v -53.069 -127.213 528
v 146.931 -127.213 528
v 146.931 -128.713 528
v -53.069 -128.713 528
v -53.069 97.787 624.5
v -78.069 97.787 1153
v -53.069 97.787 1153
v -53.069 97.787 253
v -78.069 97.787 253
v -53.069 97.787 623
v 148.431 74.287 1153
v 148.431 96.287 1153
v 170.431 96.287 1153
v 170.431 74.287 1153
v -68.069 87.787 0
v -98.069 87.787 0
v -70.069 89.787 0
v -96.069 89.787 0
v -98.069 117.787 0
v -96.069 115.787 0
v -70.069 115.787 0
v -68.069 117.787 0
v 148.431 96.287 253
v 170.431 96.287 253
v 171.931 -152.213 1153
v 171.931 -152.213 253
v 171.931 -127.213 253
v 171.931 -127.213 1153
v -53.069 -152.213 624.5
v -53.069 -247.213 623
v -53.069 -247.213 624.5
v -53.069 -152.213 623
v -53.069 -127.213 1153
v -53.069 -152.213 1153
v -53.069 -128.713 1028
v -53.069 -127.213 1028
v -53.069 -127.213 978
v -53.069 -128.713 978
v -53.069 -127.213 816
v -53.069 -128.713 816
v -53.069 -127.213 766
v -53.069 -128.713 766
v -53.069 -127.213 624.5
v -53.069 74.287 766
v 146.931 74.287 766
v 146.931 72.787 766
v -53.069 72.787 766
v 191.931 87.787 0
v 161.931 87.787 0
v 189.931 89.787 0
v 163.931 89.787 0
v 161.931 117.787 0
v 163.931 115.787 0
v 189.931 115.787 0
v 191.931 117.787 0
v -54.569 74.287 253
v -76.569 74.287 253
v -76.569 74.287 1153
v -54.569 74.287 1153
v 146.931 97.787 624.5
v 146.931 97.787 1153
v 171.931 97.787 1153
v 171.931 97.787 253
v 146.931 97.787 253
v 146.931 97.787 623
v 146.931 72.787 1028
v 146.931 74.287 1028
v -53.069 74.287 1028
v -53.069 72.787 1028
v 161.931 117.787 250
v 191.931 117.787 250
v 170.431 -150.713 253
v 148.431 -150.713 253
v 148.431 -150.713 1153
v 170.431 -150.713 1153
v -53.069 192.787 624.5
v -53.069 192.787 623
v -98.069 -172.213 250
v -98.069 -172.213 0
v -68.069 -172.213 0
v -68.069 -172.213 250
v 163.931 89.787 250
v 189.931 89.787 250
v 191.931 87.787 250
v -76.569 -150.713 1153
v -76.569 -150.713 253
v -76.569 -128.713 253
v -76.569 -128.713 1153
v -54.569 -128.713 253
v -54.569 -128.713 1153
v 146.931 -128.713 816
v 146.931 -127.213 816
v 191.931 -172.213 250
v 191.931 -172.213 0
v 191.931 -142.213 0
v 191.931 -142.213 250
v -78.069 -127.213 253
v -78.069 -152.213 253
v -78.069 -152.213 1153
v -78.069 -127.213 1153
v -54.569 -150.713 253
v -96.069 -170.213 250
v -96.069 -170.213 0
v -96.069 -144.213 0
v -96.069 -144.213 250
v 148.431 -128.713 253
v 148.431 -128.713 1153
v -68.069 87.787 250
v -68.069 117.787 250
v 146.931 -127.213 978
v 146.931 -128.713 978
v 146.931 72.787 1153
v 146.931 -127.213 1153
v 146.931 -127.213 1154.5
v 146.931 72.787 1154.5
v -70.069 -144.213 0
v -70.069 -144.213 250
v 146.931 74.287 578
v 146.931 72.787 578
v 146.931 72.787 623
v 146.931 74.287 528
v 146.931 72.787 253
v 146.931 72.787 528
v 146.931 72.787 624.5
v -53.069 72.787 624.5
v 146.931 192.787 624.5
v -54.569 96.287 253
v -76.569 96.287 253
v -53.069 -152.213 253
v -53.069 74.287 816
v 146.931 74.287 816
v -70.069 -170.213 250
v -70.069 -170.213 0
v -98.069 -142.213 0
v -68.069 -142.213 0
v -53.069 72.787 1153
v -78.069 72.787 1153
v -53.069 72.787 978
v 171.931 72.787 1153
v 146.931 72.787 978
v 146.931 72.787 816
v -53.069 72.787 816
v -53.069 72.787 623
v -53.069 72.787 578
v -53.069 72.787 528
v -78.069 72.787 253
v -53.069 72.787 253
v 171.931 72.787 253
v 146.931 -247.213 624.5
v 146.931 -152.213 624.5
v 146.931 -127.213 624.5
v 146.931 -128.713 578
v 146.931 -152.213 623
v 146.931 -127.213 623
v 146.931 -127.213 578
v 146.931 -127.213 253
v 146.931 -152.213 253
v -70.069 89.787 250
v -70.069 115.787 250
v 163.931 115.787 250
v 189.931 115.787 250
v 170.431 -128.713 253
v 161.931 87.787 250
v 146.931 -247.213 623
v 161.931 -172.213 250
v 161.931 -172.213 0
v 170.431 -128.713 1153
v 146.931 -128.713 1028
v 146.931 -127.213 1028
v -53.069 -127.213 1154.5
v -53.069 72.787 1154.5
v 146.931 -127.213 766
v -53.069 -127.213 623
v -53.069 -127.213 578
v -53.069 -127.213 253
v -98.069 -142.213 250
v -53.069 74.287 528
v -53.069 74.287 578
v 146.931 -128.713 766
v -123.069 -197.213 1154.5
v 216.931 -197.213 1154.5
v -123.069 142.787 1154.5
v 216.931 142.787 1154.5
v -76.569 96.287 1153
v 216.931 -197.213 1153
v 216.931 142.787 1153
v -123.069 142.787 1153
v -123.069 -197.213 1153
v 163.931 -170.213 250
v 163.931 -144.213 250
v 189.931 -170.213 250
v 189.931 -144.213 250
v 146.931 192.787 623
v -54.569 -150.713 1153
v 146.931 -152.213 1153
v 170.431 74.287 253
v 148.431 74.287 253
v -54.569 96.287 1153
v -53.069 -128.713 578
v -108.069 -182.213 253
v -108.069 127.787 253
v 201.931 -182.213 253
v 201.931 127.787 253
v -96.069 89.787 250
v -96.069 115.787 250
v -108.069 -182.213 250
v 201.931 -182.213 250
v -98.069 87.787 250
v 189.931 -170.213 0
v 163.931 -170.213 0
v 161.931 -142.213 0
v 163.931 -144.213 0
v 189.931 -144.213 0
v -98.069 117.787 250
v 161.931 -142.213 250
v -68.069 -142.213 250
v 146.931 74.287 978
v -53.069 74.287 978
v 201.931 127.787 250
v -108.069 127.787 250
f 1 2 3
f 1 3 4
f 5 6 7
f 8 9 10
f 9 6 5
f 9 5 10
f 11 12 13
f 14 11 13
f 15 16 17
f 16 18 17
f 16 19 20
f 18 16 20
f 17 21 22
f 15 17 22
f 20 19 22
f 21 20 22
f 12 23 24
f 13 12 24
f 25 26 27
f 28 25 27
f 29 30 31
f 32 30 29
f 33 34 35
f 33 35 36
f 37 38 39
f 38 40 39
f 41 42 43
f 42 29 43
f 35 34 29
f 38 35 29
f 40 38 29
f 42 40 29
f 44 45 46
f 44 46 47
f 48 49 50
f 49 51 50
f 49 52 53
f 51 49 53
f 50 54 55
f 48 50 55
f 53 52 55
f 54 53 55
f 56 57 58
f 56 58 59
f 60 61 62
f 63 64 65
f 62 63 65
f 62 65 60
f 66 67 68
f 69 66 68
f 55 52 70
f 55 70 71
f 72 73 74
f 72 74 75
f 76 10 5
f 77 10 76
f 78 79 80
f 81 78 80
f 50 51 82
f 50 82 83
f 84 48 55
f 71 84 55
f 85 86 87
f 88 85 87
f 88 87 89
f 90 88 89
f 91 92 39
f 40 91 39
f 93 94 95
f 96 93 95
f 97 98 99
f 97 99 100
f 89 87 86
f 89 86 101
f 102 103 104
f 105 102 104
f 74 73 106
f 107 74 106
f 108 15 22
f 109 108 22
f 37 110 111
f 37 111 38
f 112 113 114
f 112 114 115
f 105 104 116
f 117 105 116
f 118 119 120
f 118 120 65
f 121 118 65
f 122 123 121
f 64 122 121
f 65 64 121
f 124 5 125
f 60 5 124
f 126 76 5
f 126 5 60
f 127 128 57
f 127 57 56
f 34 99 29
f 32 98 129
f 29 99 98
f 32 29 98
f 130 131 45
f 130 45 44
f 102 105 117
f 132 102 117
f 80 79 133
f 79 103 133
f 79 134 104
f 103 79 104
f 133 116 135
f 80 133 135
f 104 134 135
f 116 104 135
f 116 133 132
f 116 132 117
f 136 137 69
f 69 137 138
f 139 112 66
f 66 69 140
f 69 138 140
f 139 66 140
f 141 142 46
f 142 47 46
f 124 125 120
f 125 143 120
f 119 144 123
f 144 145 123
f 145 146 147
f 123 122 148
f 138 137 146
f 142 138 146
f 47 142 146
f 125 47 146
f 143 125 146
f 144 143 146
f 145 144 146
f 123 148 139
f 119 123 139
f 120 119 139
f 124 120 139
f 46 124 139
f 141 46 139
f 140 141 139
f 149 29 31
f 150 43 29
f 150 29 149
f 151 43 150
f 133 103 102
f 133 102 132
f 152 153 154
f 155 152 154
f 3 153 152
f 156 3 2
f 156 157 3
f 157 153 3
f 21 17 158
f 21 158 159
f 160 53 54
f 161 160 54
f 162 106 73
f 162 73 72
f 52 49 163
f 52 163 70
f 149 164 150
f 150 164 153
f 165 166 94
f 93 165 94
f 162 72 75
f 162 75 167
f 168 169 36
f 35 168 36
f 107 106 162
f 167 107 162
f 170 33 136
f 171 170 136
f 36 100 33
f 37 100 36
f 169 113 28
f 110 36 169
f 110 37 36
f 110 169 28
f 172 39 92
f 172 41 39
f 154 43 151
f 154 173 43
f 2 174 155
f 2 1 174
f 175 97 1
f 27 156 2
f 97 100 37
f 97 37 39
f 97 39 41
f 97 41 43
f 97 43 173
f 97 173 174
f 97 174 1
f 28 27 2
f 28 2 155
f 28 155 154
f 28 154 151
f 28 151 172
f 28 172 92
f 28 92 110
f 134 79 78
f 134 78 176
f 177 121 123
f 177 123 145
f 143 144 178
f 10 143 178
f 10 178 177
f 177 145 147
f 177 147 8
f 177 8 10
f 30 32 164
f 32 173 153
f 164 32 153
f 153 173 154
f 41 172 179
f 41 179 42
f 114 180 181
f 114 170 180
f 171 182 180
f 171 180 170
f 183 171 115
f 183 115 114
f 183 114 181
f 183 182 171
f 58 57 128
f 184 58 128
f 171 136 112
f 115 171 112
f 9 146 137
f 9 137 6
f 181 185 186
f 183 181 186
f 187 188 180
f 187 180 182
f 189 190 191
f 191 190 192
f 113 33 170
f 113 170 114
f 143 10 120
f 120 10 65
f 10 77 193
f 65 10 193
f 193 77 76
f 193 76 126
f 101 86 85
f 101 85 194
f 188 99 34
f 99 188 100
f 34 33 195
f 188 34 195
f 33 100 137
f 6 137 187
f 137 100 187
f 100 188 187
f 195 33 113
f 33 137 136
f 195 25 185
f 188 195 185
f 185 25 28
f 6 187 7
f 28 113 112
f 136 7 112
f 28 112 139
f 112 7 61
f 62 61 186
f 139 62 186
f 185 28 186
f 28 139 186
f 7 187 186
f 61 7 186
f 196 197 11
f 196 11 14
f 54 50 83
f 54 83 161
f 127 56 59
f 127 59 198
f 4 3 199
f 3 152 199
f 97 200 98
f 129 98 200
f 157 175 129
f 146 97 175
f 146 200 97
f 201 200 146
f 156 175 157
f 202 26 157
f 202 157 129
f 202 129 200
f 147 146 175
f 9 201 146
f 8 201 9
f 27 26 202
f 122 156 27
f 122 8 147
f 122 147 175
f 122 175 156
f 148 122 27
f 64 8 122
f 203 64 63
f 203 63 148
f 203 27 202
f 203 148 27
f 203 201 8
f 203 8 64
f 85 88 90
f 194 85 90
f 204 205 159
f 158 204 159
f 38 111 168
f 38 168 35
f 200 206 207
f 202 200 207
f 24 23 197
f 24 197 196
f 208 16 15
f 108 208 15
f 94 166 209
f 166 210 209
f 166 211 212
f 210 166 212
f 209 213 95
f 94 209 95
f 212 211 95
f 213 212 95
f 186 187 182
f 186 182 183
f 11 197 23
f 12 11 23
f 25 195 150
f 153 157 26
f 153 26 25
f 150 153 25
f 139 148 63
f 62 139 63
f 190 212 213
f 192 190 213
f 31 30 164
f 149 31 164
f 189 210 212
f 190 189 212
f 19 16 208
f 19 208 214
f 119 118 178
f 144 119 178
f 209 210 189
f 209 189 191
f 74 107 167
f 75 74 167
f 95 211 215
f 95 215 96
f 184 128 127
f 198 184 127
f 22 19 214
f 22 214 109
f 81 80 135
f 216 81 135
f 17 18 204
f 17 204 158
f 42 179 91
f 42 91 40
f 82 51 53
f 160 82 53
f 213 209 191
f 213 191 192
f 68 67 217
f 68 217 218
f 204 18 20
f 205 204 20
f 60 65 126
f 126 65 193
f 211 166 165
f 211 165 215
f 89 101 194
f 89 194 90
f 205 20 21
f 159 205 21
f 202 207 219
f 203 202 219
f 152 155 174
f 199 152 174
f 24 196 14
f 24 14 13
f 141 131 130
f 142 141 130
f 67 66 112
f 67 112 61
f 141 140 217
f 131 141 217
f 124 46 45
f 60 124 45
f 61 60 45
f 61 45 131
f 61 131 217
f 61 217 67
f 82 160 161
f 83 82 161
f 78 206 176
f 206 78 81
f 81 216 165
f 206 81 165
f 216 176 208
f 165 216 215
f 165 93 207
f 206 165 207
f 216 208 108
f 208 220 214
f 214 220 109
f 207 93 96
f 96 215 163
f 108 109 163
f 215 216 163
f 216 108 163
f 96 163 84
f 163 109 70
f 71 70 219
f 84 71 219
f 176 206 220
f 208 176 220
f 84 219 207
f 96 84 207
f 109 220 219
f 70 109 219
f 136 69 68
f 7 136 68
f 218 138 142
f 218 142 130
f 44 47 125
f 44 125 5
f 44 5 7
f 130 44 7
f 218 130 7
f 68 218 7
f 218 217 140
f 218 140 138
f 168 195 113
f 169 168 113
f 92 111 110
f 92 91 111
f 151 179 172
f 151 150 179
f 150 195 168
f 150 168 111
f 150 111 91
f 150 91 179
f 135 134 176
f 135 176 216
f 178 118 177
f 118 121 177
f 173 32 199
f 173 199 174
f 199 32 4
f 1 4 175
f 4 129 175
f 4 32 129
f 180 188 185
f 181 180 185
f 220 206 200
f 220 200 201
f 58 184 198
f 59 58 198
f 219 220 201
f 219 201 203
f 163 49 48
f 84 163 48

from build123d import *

# Parameters (mm, degrees)
SKETCH_1_W        = 30
SKETCH_1_H        = 30
SKETCH_1_W_2      = 26
SKETCH_1_H_2      = 26
EXTRUDE_1_DEPTH   = 250
EXTRUDE_1_2_DEPTH = 250
EXTRUDE_1_3_DEPTH = 250
EXTRUDE_1_4_DEPTH = 250
SKETCH_2_W        = 310
SKETCH_2_H        = 310
EXTRUDE_2_DEPTH   = 3
SKETCH_5_W        = 25
SKETCH_5_H        = 25
SKETCH_5_W_2      = 22
SKETCH_5_H_2      = 22
EXTRUDE_3_DEPTH   = 900
SKETCH_6_W        = 340
SKETCH_6_H        = 340
SKETCH_6_W_2      = 200
SKETCH_6_H_2      = 200
EXTRUDE_4_DEPTH   = 1.5
SKETCH_7_W        = 200
SKETCH_7_H        = 120
EXTRUDE_5_DEPTH   = 1.5
SKETCH_8_W        = 200
SKETCH_8_H        = 1.5
EXTRUDE_6_DEPTH   = 25
SKETCH_9_W        = 200
SKETCH_9_H        = 1.5
EXTRUDE_7_DEPTH   = 25
SKETCH_11_W       = 200
SKETCH_11_H       = 1.5
EXTRUDE_8_DEPTH   = 25


with BuildPart() as part:
    # 草圖1 → 填料-伸長1 (new body)
    with BuildSketch(Plane.XY):
        with Locations((-83.068744212, 102.787427317)):
            Rectangle(SKETCH_1_W, SKETCH_1_H)
        with Locations((-83.068744212, 102.787427317)):
            Rectangle(SKETCH_1_W_2, SKETCH_1_H_2, mode=Mode.SUBTRACT)
    extrude(amount=EXTRUDE_1_DEPTH)



with BuildPart() as body_2:
    # 草圖1 → Extrude 1 2 (new body)
    with BuildSketch(Plane.XY):
        with Locations((176.931255788, 102.787427317)):
            Rectangle(SKETCH_1_W, SKETCH_1_H)
        with Locations((176.931255788, 102.787427317)):
            Rectangle(SKETCH_1_W_2, SKETCH_1_H_2, mode=Mode.SUBTRACT)
    extrude(amount=EXTRUDE_1_2_DEPTH)


with BuildPart() as body_3:
    # 草圖1 → Extrude 1 3 (new body)
    with BuildSketch(Plane.XY):
        with Locations((-83.068744212, -157.212572683)):
            Rectangle(SKETCH_1_W, SKETCH_1_H)
        with Locations((-83.068744212, -157.212572683)):
            Rectangle(SKETCH_1_W_2, SKETCH_1_H_2, mode=Mode.SUBTRACT)
    extrude(amount=EXTRUDE_1_3_DEPTH)


with BuildPart() as body_4:
    # 草圖1 → Extrude 1 4 (new body)
    with BuildSketch(Plane.XY):
        with Locations((176.931255788, -157.212572683)):
            Rectangle(SKETCH_1_W, SKETCH_1_H)
        with Locations((176.931255788, -157.212572683)):
            Rectangle(SKETCH_1_W_2, SKETCH_1_H_2, mode=Mode.SUBTRACT)
    extrude(amount=EXTRUDE_1_4_DEPTH)


with BuildPart() as part_1:
    add(part.part)

    add(body_2.part)  # 填料-伸長2 merges body 2

    add(body_3.part)  # 填料-伸長2 merges body 3

    add(body_4.part)  # 填料-伸長2 merges body 4
    # 草圖2 → 填料-伸長2 (add)
    with BuildSketch(Plane.XY.offset(250)):
        with Locations((46.931255788, -27.212572683)):
            Rectangle(SKETCH_2_W, SKETCH_2_H)
    extrude(amount=EXTRUDE_2_DEPTH)

    # 草圖5 → 填料-伸長3 (add)
    with BuildSketch(Plane.XY.offset(253)):
        with Locations((-65.568744212, 85.287427317)):
            Rectangle(SKETCH_5_W, SKETCH_5_H)
        with Locations((-65.568744212, 85.287427317)):
            Rectangle(SKETCH_5_W_2, SKETCH_5_H_2, mode=Mode.SUBTRACT)
        with Locations((-65.568744212, -139.712572683)):
            Rectangle(SKETCH_5_W, SKETCH_5_H)
        with Locations((-65.568744212, -139.712572683)):
            Rectangle(SKETCH_5_W_2, SKETCH_5_H_2, mode=Mode.SUBTRACT)
        with Locations((159.431255788, -139.712572683)):
            Rectangle(SKETCH_5_W, SKETCH_5_H)
        with Locations((159.431255788, -139.712572683)):
            Rectangle(SKETCH_5_W_2, SKETCH_5_H_2, mode=Mode.SUBTRACT)
        with Locations((159.431255788, 85.287427317)):
            Rectangle(SKETCH_5_W, SKETCH_5_H)
        with Locations((159.431255788, 85.287427317)):
            Rectangle(SKETCH_5_W_2, SKETCH_5_H_2, mode=Mode.SUBTRACT)
    extrude(amount=EXTRUDE_3_DEPTH)

    # 草圖6 → 填料-伸長4 (add)
    with BuildSketch(Plane.XY.offset(1153)):
        with Locations((46.931255788, -27.212572683)):
            Rectangle(SKETCH_6_W, SKETCH_6_H)
        with Locations((46.931255788, -27.212572683)):
            Rectangle(SKETCH_6_W_2, SKETCH_6_H_2, mode=Mode.SUBTRACT)
    extrude(amount=EXTRUDE_4_DEPTH)

    # 草圖7 → 填料-伸長5 (add)
    with BuildSketch(Plane.XY.offset(623)):
        with Locations((46.931255788, 132.787427317)):
            Rectangle(SKETCH_7_W, SKETCH_7_H)
        with Locations((46.931255788, -187.212572683)):
            Rectangle(SKETCH_7_W, SKETCH_7_H)
    extrude(amount=EXTRUDE_5_DEPTH)

    # 草圖8 → 填料-伸長6 (add, symmetric)
    with BuildSketch(Plane(origin=(0, 0, 1003), x_dir=(-1, 0, 0), z_dir=(0, 0, -1))):
        with Locations((-46.931255788, 73.537427317)):
            Rectangle(SKETCH_8_W, SKETCH_8_H)
        with Locations((-46.931255788, -127.962572683)):
            Rectangle(SKETCH_8_W, SKETCH_8_H)
    extrude(amount=EXTRUDE_6_DEPTH, both=True)

    # 草圖9 → 填料-伸長7 (add, symmetric)
    with BuildSketch(Plane(origin=(0, 0, 791), x_dir=(-1, 0, 0), z_dir=(0, 0, -1))):
        with Locations((-46.931255788, 73.537427317)):
            Rectangle(SKETCH_9_W, SKETCH_9_H)
        with Locations((-46.931255788, -127.962572683)):
            Rectangle(SKETCH_9_W, SKETCH_9_H)
    extrude(amount=EXTRUDE_7_DEPTH, both=True)

    # 草圖11 → 填料-伸長8 (add, symmetric)
    with BuildSketch(Plane(origin=(0, 0, 553), x_dir=(-1, 0, 0), z_dir=(0, 0, -1))):
        with Locations((-46.931255788, -127.962572683)):
            Rectangle(SKETCH_11_W, SKETCH_11_H)
        with Locations((-46.931255788, 73.537427317)):
            Rectangle(SKETCH_11_W, SKETCH_11_H)
    extrude(amount=EXTRUDE_8_DEPTH, both=True)


solid = part_1.part
